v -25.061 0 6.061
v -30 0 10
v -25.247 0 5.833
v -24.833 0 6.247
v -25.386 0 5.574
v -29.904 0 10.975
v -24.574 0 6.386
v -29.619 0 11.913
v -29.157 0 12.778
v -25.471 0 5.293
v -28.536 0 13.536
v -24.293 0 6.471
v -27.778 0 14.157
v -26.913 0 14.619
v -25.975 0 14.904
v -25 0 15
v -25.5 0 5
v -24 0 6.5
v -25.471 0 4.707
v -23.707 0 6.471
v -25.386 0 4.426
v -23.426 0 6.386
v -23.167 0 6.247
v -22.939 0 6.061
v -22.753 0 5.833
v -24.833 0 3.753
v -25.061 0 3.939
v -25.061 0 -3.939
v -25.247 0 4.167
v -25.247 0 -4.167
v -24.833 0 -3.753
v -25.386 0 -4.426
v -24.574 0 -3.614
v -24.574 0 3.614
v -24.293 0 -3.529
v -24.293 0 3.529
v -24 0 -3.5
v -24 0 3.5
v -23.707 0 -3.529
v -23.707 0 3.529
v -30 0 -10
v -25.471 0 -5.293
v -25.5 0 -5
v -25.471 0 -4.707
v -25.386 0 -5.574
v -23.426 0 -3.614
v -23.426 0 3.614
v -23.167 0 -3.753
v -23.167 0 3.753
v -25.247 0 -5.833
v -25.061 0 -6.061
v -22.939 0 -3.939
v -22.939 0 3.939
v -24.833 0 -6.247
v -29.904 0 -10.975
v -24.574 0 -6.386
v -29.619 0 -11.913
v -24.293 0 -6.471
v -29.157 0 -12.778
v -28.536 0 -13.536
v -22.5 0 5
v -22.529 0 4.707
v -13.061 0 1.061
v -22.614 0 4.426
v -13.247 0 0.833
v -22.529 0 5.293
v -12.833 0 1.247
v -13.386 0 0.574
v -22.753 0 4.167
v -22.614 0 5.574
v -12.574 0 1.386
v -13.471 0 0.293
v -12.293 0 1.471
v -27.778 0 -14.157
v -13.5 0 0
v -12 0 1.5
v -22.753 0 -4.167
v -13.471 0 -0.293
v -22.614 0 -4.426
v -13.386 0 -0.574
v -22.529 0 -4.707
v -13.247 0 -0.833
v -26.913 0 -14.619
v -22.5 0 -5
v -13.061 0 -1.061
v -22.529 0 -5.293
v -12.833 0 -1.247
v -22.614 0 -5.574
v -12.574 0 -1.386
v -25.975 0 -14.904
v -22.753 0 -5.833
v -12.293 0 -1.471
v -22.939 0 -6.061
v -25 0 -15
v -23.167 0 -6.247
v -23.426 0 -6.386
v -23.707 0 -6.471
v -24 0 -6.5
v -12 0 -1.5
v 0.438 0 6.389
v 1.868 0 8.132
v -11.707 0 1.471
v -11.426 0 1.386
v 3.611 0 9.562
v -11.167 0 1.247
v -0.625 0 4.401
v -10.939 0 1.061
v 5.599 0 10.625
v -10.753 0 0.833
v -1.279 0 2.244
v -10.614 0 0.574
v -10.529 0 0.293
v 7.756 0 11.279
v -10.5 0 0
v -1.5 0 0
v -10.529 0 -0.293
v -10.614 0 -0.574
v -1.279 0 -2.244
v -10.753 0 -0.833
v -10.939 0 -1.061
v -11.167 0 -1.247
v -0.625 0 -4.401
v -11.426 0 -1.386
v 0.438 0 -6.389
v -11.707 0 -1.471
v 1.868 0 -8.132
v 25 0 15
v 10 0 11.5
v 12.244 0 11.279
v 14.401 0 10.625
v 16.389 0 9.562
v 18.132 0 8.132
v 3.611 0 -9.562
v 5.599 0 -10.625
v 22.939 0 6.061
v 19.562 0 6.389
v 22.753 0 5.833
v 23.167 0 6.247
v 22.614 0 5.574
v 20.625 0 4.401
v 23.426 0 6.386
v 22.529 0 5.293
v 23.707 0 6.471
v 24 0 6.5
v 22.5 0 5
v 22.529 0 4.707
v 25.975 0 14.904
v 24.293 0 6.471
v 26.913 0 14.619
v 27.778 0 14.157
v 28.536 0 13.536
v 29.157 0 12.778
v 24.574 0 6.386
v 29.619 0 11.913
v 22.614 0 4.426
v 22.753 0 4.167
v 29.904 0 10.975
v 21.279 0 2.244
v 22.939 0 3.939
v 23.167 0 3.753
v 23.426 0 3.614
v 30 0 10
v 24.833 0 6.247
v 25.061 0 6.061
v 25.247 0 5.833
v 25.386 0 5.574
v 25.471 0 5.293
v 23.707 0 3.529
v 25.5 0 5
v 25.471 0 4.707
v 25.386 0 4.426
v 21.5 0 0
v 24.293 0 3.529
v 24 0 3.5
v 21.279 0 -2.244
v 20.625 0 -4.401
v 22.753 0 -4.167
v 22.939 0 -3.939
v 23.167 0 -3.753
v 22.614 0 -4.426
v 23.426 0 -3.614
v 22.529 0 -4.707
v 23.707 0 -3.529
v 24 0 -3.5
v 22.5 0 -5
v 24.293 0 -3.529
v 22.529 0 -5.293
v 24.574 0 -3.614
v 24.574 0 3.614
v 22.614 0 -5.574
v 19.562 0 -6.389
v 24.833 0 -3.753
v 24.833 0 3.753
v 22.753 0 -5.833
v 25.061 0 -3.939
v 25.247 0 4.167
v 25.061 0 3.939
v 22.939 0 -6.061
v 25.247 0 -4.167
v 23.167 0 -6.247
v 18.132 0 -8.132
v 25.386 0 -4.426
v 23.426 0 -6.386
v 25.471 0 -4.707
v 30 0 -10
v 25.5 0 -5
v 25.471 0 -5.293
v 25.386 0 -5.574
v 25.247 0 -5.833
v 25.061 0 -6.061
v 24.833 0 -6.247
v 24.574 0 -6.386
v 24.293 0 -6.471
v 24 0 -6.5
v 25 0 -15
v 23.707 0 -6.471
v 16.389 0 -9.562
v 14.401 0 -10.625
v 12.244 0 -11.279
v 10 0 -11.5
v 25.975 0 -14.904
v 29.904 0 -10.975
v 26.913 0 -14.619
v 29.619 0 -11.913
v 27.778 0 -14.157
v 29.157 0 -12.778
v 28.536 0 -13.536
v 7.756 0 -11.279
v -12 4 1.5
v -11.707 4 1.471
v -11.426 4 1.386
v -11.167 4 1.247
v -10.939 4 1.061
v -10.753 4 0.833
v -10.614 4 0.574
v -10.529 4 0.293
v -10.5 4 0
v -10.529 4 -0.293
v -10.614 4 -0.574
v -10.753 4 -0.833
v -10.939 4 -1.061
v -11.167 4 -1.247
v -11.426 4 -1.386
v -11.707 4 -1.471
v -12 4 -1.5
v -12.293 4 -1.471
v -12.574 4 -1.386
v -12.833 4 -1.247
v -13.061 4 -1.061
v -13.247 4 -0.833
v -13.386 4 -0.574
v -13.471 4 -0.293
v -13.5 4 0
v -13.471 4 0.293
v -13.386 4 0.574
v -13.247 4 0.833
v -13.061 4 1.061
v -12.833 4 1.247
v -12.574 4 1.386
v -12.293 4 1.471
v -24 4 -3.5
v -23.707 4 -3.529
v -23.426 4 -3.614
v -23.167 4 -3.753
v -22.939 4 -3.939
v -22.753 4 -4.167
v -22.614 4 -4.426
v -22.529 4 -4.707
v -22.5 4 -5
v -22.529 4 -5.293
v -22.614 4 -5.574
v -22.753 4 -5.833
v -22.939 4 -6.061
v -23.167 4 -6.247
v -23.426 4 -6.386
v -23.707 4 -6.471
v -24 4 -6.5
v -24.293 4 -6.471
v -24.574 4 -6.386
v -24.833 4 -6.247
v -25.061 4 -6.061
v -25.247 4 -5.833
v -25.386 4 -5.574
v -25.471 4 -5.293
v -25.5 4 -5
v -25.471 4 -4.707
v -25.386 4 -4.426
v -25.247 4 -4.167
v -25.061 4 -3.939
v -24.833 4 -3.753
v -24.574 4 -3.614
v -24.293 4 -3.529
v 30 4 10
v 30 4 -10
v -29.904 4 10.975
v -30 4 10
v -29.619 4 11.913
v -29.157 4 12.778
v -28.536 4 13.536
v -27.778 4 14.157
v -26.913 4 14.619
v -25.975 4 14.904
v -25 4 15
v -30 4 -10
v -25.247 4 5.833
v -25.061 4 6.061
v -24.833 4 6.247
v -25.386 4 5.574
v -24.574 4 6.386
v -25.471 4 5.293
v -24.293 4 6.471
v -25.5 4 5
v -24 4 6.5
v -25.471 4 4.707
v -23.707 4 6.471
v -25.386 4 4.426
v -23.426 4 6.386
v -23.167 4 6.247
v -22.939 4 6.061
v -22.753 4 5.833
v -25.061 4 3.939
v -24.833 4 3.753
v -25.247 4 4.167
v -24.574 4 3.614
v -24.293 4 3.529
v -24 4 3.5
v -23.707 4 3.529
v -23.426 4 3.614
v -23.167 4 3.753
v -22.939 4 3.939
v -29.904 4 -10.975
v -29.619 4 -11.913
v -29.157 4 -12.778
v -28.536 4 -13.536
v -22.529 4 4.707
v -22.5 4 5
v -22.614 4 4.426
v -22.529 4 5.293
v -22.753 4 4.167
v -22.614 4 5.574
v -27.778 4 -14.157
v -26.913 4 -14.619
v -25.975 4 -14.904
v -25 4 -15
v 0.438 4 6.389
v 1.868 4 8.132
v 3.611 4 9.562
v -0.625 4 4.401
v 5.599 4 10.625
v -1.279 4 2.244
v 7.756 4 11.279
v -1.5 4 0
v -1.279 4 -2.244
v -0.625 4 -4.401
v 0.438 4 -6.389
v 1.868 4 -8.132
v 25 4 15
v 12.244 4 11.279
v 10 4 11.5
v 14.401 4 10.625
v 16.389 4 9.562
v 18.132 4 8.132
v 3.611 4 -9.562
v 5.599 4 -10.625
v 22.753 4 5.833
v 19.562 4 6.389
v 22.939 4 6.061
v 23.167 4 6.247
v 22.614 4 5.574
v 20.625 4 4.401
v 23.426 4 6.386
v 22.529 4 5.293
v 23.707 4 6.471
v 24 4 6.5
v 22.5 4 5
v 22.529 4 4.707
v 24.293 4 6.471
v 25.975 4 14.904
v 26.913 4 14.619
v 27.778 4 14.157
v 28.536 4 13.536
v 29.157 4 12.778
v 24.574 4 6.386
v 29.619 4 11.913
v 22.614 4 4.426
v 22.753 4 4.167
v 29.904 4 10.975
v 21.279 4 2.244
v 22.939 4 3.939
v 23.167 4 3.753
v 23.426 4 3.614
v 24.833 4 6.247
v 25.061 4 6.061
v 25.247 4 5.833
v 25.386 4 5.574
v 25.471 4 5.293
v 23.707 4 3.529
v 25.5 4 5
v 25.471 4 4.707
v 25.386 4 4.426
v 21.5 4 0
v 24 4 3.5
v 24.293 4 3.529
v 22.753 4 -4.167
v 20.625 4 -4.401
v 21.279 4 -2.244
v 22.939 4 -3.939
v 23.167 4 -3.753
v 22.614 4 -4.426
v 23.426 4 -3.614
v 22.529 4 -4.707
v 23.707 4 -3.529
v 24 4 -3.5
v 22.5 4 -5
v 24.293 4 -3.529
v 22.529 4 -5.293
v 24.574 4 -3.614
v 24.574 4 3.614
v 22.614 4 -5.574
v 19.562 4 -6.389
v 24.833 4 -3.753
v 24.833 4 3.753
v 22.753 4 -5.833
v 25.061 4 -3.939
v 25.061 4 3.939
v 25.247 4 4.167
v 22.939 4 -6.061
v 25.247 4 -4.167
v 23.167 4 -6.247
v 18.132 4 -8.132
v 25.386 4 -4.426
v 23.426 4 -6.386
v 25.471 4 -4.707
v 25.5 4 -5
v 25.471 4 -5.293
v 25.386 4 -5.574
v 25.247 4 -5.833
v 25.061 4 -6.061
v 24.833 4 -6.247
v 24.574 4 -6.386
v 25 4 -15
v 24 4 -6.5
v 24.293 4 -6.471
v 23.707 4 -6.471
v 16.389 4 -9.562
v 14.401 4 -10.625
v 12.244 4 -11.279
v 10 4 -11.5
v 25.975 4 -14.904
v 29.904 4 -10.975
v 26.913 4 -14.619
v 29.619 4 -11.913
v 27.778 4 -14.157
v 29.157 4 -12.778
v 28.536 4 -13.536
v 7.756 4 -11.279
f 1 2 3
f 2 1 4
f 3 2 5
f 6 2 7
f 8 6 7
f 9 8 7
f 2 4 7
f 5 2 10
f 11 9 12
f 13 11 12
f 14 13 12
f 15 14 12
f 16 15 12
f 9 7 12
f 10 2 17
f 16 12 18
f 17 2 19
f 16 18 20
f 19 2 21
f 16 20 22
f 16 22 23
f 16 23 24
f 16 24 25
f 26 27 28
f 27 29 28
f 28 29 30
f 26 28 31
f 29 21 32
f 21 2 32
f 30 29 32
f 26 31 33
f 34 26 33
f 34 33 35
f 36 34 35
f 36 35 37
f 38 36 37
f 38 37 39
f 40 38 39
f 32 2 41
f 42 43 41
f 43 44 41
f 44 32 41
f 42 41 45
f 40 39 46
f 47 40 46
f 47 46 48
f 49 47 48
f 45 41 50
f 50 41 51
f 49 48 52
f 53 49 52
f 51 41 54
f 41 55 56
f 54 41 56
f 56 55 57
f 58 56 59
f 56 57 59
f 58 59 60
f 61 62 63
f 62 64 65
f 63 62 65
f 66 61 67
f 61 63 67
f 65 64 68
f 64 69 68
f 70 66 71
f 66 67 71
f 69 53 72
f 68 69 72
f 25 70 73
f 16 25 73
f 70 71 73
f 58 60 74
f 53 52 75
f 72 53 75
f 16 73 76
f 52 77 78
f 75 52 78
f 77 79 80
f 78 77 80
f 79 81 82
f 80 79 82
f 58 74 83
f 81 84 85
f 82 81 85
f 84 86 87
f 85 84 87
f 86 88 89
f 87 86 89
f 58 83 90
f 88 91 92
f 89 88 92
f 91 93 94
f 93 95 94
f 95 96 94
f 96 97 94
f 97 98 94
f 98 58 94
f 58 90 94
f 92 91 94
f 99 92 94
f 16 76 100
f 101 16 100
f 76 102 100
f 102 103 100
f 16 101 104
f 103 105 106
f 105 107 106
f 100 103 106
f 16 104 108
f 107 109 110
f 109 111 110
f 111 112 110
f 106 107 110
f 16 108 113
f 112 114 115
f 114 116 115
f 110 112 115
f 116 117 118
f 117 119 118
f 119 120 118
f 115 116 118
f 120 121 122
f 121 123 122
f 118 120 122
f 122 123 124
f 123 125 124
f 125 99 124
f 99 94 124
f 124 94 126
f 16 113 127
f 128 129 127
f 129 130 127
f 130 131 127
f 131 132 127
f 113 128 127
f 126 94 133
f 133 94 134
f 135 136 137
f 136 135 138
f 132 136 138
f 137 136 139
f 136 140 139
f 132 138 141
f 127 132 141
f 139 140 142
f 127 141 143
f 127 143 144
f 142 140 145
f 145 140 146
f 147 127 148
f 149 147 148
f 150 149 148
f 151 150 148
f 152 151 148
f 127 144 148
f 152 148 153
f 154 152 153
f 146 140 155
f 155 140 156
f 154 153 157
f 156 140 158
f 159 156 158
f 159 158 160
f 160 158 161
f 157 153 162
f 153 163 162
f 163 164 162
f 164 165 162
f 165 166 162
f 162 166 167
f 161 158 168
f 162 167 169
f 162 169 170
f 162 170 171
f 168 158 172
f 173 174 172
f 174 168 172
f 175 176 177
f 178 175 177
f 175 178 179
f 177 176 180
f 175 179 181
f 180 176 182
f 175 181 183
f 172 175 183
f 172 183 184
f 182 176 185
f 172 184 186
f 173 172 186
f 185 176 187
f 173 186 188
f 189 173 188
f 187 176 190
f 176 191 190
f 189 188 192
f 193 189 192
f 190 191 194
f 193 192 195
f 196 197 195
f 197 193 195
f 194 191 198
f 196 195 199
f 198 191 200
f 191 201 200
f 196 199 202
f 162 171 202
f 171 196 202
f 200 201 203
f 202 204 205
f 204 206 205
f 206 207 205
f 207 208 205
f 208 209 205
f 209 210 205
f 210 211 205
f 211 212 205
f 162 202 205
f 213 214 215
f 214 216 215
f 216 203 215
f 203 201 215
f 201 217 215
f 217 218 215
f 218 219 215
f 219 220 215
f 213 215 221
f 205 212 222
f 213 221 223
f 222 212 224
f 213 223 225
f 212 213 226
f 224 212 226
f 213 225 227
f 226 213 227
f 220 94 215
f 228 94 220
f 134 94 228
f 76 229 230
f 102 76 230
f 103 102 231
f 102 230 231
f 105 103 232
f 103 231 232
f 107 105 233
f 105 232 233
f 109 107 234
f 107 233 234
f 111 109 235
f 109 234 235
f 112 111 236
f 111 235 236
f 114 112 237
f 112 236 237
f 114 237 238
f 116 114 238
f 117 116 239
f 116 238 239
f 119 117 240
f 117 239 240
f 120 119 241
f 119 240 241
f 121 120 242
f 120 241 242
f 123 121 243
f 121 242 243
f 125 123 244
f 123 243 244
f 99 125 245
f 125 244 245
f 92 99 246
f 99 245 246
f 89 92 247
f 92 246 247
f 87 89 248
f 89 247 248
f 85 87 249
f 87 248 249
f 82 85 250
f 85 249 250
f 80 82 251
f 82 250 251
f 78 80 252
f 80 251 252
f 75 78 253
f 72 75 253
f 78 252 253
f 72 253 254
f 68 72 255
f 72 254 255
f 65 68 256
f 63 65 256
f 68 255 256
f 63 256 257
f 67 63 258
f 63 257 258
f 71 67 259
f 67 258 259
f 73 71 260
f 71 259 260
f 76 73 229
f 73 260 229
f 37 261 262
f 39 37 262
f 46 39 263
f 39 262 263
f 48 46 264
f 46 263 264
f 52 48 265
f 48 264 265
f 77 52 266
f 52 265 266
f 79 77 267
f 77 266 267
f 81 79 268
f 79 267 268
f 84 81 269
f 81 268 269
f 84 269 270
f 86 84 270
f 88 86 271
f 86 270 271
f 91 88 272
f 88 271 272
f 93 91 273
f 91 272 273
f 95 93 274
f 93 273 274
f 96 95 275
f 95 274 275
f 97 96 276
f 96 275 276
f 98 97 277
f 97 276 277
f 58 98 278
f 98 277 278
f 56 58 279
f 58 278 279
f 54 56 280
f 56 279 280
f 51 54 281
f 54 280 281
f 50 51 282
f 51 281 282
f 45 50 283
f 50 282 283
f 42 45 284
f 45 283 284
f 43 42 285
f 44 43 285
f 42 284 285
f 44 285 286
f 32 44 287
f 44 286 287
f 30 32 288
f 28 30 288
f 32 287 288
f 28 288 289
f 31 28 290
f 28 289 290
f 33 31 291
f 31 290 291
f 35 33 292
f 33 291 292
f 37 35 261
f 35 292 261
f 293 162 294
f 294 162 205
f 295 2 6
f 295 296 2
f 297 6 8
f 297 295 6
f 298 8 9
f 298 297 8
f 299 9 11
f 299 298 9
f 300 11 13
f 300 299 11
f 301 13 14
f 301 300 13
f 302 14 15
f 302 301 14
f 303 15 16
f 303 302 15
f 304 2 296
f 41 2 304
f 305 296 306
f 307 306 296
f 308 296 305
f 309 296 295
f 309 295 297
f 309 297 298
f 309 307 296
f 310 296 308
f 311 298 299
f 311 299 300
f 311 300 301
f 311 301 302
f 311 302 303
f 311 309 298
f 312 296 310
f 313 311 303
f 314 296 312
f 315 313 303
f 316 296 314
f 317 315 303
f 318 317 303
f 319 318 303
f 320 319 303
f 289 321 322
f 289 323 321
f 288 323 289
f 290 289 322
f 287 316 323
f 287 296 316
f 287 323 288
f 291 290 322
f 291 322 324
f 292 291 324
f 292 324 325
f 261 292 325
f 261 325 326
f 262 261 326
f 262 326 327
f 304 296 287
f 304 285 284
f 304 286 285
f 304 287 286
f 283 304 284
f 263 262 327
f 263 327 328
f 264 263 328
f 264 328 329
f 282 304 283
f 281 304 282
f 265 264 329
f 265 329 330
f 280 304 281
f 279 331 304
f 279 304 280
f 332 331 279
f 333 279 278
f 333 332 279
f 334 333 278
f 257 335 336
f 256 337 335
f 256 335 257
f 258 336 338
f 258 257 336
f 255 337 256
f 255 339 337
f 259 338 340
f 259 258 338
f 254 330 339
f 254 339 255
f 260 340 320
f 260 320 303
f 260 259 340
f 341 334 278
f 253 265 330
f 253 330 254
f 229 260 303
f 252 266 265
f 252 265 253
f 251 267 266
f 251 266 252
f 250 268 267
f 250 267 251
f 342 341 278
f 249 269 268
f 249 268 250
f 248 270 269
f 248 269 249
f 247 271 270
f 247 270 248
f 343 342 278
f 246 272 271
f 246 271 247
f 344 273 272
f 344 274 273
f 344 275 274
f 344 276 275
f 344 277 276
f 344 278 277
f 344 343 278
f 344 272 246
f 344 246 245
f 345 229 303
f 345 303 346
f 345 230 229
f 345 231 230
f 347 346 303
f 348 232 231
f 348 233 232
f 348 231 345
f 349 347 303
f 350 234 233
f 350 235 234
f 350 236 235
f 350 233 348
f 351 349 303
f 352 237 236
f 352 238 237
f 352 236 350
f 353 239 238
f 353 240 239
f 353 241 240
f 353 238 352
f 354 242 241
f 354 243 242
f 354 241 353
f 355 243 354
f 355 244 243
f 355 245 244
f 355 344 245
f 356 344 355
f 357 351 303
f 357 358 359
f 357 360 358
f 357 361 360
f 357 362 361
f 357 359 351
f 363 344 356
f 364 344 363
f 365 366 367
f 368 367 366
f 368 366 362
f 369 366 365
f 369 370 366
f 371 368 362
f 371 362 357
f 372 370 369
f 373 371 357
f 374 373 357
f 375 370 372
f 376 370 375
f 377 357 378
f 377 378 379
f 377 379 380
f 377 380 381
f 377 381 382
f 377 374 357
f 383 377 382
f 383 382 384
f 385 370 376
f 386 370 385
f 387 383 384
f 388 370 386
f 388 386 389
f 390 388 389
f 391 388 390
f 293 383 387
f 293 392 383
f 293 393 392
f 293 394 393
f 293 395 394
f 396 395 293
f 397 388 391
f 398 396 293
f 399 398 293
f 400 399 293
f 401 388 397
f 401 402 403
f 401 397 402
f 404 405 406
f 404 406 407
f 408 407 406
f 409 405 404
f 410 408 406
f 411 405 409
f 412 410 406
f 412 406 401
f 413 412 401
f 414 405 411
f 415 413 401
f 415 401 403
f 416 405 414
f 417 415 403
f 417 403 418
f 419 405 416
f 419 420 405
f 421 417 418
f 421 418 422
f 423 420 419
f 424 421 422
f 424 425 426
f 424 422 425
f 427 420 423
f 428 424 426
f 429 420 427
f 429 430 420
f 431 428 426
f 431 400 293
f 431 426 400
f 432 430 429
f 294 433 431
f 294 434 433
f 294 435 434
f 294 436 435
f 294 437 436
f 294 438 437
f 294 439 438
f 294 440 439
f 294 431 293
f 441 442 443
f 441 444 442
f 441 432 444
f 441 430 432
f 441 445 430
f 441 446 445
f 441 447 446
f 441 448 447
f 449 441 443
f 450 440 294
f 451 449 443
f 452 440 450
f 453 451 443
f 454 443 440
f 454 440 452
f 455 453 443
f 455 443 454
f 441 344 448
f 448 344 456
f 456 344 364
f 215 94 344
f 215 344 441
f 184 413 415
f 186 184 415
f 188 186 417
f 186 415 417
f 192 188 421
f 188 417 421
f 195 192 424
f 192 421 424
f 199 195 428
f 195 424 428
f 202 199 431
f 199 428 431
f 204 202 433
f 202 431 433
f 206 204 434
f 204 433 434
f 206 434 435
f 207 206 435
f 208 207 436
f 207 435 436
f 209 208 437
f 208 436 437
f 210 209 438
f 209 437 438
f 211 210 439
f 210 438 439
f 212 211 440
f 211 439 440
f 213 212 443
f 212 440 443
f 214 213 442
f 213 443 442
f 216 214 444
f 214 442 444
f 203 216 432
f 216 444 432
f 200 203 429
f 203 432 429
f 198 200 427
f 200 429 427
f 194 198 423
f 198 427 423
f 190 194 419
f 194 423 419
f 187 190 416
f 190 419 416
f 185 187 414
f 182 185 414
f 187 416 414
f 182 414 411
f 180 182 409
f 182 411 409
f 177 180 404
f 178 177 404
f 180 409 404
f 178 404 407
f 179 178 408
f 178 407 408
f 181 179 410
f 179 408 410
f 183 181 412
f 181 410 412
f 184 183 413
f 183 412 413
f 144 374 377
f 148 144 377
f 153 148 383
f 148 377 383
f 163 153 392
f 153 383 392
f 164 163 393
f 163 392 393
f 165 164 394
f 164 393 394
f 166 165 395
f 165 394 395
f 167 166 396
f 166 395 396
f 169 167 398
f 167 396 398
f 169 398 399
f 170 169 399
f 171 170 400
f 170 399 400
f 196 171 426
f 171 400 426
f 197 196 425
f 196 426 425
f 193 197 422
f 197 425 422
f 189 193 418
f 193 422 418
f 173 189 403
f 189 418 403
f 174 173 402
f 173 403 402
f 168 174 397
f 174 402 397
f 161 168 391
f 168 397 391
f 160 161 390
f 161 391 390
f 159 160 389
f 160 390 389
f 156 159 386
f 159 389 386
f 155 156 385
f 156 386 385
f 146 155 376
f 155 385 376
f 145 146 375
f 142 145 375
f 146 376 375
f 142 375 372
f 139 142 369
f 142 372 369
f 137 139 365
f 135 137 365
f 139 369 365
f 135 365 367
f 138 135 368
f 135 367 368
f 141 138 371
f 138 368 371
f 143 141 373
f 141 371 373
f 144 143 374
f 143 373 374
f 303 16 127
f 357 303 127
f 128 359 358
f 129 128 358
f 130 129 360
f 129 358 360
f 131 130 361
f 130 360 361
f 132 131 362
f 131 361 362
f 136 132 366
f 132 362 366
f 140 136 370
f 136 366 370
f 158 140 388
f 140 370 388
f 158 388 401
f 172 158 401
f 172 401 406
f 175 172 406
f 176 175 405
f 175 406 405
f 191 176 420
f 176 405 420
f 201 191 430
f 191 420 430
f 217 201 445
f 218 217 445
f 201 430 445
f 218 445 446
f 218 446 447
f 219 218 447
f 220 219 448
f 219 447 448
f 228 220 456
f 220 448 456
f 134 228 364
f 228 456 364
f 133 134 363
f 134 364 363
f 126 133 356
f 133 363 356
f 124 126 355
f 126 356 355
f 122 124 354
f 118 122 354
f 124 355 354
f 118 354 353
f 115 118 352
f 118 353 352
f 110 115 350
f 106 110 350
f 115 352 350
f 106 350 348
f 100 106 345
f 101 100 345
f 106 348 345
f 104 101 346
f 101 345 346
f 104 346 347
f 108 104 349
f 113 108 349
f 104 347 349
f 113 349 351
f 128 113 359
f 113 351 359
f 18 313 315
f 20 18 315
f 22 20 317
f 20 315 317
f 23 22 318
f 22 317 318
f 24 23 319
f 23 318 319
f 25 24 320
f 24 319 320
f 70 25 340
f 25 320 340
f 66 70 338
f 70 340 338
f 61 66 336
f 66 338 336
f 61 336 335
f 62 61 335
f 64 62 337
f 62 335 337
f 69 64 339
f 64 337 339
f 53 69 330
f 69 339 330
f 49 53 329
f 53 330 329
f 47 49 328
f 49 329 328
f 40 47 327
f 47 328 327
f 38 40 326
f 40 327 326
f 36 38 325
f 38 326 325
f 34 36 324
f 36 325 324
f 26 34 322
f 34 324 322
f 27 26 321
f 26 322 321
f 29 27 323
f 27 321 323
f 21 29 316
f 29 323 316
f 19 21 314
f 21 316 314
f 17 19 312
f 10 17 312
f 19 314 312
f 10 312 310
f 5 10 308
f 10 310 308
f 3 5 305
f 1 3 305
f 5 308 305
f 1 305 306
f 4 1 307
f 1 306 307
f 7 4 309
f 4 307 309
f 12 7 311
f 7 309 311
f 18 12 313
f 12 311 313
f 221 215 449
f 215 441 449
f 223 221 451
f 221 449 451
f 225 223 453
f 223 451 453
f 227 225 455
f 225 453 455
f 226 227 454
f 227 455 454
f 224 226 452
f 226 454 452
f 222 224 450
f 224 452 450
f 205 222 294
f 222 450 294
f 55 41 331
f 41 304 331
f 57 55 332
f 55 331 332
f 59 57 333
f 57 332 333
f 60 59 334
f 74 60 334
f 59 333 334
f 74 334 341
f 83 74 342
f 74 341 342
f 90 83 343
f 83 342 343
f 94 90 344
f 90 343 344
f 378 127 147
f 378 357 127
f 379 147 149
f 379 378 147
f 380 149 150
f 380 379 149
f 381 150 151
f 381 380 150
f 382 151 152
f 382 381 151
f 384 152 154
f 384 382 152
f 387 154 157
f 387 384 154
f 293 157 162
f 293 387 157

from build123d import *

# Parameters (mm, degrees)
SKETCH_1_W          = 60
SKETCH_1_H          = 30
EXTRUDE_1_DEPTH     = 4
SKETCH_2_R          = 1.5
CUT_EXTRUDE_1_DEPTH = 4
SKETCH_3_R          = 11.5
CUT_EXTRUDE_2_DEPTH = 4
SKETCH_4_R          = 1.5
CUT_EXTRUDE_3_DEPTH = 4
FILLET_1_R          = 5


with BuildPart() as part:
    # 草图1 → 凸台-拉伸1 (new body)
    with BuildSketch(Plane(origin=(0, 0, 0), x_dir=(1, 0, 0), z_dir=(0, 1, 0))):
        Rectangle(SKETCH_1_W, SKETCH_1_H)
    extrude(amount=EXTRUDE_1_DEPTH)

    # 草图2 → 切除-拉伸1 (cut)
    with BuildSketch(Plane(origin=(0, 4, 0), x_dir=(1, 0, 0), z_dir=(0, 1, 0))):
        with Locations(Location((-24, 5, 0), (0, 0, 270))):
            Circle(SKETCH_2_R)
        with Locations(Location((-24, -5, 0), (0, 0, 270))):
            Circle(SKETCH_2_R)
        with Locations(Location((24, -5, 0), (0, 0, 270))):
            Circle(SKETCH_2_R)
        with Locations(Location((24, 5, 0), (0, 0, 270))):
            Circle(SKETCH_2_R)
    extrude(amount=-CUT_EXTRUDE_1_DEPTH, mode=Mode.SUBTRACT)

    # 草图3 → 切除-拉伸2 (cut)
    with BuildSketch(Plane(origin=(0, 4, 0), x_dir=(1, 0, 0), z_dir=(0, 1, 0))):
        with Locations(Location((10, 0, 0), (0, 0, 270))):
            Circle(SKETCH_3_R)
    extrude(amount=-CUT_EXTRUDE_2_DEPTH, mode=Mode.SUBTRACT)

    # 草图4 → 切除-拉伸3 (cut)
    with BuildSketch(Plane(origin=(0, 4, 0), x_dir=(1, 0, 0), z_dir=(0, 1, 0))):
        with Locations(Location((-12, 0, 0), (0, 0, 270))):
            Circle(SKETCH_4_R)
    extrude(amount=-CUT_EXTRUDE_3_DEPTH, mode=Mode.SUBTRACT)

    # 圆角1
    fillet_1_edges = [part.edges().sort_by_distance(p)[0] for p in [
        (30, 2, 15),
        (-30, 2, 15),
        (-30, 2, -15),
        (30, 2, -15),
    ]]
    fillet(fillet_1_edges, radius=FILLET_1_R)


solid = part.part
